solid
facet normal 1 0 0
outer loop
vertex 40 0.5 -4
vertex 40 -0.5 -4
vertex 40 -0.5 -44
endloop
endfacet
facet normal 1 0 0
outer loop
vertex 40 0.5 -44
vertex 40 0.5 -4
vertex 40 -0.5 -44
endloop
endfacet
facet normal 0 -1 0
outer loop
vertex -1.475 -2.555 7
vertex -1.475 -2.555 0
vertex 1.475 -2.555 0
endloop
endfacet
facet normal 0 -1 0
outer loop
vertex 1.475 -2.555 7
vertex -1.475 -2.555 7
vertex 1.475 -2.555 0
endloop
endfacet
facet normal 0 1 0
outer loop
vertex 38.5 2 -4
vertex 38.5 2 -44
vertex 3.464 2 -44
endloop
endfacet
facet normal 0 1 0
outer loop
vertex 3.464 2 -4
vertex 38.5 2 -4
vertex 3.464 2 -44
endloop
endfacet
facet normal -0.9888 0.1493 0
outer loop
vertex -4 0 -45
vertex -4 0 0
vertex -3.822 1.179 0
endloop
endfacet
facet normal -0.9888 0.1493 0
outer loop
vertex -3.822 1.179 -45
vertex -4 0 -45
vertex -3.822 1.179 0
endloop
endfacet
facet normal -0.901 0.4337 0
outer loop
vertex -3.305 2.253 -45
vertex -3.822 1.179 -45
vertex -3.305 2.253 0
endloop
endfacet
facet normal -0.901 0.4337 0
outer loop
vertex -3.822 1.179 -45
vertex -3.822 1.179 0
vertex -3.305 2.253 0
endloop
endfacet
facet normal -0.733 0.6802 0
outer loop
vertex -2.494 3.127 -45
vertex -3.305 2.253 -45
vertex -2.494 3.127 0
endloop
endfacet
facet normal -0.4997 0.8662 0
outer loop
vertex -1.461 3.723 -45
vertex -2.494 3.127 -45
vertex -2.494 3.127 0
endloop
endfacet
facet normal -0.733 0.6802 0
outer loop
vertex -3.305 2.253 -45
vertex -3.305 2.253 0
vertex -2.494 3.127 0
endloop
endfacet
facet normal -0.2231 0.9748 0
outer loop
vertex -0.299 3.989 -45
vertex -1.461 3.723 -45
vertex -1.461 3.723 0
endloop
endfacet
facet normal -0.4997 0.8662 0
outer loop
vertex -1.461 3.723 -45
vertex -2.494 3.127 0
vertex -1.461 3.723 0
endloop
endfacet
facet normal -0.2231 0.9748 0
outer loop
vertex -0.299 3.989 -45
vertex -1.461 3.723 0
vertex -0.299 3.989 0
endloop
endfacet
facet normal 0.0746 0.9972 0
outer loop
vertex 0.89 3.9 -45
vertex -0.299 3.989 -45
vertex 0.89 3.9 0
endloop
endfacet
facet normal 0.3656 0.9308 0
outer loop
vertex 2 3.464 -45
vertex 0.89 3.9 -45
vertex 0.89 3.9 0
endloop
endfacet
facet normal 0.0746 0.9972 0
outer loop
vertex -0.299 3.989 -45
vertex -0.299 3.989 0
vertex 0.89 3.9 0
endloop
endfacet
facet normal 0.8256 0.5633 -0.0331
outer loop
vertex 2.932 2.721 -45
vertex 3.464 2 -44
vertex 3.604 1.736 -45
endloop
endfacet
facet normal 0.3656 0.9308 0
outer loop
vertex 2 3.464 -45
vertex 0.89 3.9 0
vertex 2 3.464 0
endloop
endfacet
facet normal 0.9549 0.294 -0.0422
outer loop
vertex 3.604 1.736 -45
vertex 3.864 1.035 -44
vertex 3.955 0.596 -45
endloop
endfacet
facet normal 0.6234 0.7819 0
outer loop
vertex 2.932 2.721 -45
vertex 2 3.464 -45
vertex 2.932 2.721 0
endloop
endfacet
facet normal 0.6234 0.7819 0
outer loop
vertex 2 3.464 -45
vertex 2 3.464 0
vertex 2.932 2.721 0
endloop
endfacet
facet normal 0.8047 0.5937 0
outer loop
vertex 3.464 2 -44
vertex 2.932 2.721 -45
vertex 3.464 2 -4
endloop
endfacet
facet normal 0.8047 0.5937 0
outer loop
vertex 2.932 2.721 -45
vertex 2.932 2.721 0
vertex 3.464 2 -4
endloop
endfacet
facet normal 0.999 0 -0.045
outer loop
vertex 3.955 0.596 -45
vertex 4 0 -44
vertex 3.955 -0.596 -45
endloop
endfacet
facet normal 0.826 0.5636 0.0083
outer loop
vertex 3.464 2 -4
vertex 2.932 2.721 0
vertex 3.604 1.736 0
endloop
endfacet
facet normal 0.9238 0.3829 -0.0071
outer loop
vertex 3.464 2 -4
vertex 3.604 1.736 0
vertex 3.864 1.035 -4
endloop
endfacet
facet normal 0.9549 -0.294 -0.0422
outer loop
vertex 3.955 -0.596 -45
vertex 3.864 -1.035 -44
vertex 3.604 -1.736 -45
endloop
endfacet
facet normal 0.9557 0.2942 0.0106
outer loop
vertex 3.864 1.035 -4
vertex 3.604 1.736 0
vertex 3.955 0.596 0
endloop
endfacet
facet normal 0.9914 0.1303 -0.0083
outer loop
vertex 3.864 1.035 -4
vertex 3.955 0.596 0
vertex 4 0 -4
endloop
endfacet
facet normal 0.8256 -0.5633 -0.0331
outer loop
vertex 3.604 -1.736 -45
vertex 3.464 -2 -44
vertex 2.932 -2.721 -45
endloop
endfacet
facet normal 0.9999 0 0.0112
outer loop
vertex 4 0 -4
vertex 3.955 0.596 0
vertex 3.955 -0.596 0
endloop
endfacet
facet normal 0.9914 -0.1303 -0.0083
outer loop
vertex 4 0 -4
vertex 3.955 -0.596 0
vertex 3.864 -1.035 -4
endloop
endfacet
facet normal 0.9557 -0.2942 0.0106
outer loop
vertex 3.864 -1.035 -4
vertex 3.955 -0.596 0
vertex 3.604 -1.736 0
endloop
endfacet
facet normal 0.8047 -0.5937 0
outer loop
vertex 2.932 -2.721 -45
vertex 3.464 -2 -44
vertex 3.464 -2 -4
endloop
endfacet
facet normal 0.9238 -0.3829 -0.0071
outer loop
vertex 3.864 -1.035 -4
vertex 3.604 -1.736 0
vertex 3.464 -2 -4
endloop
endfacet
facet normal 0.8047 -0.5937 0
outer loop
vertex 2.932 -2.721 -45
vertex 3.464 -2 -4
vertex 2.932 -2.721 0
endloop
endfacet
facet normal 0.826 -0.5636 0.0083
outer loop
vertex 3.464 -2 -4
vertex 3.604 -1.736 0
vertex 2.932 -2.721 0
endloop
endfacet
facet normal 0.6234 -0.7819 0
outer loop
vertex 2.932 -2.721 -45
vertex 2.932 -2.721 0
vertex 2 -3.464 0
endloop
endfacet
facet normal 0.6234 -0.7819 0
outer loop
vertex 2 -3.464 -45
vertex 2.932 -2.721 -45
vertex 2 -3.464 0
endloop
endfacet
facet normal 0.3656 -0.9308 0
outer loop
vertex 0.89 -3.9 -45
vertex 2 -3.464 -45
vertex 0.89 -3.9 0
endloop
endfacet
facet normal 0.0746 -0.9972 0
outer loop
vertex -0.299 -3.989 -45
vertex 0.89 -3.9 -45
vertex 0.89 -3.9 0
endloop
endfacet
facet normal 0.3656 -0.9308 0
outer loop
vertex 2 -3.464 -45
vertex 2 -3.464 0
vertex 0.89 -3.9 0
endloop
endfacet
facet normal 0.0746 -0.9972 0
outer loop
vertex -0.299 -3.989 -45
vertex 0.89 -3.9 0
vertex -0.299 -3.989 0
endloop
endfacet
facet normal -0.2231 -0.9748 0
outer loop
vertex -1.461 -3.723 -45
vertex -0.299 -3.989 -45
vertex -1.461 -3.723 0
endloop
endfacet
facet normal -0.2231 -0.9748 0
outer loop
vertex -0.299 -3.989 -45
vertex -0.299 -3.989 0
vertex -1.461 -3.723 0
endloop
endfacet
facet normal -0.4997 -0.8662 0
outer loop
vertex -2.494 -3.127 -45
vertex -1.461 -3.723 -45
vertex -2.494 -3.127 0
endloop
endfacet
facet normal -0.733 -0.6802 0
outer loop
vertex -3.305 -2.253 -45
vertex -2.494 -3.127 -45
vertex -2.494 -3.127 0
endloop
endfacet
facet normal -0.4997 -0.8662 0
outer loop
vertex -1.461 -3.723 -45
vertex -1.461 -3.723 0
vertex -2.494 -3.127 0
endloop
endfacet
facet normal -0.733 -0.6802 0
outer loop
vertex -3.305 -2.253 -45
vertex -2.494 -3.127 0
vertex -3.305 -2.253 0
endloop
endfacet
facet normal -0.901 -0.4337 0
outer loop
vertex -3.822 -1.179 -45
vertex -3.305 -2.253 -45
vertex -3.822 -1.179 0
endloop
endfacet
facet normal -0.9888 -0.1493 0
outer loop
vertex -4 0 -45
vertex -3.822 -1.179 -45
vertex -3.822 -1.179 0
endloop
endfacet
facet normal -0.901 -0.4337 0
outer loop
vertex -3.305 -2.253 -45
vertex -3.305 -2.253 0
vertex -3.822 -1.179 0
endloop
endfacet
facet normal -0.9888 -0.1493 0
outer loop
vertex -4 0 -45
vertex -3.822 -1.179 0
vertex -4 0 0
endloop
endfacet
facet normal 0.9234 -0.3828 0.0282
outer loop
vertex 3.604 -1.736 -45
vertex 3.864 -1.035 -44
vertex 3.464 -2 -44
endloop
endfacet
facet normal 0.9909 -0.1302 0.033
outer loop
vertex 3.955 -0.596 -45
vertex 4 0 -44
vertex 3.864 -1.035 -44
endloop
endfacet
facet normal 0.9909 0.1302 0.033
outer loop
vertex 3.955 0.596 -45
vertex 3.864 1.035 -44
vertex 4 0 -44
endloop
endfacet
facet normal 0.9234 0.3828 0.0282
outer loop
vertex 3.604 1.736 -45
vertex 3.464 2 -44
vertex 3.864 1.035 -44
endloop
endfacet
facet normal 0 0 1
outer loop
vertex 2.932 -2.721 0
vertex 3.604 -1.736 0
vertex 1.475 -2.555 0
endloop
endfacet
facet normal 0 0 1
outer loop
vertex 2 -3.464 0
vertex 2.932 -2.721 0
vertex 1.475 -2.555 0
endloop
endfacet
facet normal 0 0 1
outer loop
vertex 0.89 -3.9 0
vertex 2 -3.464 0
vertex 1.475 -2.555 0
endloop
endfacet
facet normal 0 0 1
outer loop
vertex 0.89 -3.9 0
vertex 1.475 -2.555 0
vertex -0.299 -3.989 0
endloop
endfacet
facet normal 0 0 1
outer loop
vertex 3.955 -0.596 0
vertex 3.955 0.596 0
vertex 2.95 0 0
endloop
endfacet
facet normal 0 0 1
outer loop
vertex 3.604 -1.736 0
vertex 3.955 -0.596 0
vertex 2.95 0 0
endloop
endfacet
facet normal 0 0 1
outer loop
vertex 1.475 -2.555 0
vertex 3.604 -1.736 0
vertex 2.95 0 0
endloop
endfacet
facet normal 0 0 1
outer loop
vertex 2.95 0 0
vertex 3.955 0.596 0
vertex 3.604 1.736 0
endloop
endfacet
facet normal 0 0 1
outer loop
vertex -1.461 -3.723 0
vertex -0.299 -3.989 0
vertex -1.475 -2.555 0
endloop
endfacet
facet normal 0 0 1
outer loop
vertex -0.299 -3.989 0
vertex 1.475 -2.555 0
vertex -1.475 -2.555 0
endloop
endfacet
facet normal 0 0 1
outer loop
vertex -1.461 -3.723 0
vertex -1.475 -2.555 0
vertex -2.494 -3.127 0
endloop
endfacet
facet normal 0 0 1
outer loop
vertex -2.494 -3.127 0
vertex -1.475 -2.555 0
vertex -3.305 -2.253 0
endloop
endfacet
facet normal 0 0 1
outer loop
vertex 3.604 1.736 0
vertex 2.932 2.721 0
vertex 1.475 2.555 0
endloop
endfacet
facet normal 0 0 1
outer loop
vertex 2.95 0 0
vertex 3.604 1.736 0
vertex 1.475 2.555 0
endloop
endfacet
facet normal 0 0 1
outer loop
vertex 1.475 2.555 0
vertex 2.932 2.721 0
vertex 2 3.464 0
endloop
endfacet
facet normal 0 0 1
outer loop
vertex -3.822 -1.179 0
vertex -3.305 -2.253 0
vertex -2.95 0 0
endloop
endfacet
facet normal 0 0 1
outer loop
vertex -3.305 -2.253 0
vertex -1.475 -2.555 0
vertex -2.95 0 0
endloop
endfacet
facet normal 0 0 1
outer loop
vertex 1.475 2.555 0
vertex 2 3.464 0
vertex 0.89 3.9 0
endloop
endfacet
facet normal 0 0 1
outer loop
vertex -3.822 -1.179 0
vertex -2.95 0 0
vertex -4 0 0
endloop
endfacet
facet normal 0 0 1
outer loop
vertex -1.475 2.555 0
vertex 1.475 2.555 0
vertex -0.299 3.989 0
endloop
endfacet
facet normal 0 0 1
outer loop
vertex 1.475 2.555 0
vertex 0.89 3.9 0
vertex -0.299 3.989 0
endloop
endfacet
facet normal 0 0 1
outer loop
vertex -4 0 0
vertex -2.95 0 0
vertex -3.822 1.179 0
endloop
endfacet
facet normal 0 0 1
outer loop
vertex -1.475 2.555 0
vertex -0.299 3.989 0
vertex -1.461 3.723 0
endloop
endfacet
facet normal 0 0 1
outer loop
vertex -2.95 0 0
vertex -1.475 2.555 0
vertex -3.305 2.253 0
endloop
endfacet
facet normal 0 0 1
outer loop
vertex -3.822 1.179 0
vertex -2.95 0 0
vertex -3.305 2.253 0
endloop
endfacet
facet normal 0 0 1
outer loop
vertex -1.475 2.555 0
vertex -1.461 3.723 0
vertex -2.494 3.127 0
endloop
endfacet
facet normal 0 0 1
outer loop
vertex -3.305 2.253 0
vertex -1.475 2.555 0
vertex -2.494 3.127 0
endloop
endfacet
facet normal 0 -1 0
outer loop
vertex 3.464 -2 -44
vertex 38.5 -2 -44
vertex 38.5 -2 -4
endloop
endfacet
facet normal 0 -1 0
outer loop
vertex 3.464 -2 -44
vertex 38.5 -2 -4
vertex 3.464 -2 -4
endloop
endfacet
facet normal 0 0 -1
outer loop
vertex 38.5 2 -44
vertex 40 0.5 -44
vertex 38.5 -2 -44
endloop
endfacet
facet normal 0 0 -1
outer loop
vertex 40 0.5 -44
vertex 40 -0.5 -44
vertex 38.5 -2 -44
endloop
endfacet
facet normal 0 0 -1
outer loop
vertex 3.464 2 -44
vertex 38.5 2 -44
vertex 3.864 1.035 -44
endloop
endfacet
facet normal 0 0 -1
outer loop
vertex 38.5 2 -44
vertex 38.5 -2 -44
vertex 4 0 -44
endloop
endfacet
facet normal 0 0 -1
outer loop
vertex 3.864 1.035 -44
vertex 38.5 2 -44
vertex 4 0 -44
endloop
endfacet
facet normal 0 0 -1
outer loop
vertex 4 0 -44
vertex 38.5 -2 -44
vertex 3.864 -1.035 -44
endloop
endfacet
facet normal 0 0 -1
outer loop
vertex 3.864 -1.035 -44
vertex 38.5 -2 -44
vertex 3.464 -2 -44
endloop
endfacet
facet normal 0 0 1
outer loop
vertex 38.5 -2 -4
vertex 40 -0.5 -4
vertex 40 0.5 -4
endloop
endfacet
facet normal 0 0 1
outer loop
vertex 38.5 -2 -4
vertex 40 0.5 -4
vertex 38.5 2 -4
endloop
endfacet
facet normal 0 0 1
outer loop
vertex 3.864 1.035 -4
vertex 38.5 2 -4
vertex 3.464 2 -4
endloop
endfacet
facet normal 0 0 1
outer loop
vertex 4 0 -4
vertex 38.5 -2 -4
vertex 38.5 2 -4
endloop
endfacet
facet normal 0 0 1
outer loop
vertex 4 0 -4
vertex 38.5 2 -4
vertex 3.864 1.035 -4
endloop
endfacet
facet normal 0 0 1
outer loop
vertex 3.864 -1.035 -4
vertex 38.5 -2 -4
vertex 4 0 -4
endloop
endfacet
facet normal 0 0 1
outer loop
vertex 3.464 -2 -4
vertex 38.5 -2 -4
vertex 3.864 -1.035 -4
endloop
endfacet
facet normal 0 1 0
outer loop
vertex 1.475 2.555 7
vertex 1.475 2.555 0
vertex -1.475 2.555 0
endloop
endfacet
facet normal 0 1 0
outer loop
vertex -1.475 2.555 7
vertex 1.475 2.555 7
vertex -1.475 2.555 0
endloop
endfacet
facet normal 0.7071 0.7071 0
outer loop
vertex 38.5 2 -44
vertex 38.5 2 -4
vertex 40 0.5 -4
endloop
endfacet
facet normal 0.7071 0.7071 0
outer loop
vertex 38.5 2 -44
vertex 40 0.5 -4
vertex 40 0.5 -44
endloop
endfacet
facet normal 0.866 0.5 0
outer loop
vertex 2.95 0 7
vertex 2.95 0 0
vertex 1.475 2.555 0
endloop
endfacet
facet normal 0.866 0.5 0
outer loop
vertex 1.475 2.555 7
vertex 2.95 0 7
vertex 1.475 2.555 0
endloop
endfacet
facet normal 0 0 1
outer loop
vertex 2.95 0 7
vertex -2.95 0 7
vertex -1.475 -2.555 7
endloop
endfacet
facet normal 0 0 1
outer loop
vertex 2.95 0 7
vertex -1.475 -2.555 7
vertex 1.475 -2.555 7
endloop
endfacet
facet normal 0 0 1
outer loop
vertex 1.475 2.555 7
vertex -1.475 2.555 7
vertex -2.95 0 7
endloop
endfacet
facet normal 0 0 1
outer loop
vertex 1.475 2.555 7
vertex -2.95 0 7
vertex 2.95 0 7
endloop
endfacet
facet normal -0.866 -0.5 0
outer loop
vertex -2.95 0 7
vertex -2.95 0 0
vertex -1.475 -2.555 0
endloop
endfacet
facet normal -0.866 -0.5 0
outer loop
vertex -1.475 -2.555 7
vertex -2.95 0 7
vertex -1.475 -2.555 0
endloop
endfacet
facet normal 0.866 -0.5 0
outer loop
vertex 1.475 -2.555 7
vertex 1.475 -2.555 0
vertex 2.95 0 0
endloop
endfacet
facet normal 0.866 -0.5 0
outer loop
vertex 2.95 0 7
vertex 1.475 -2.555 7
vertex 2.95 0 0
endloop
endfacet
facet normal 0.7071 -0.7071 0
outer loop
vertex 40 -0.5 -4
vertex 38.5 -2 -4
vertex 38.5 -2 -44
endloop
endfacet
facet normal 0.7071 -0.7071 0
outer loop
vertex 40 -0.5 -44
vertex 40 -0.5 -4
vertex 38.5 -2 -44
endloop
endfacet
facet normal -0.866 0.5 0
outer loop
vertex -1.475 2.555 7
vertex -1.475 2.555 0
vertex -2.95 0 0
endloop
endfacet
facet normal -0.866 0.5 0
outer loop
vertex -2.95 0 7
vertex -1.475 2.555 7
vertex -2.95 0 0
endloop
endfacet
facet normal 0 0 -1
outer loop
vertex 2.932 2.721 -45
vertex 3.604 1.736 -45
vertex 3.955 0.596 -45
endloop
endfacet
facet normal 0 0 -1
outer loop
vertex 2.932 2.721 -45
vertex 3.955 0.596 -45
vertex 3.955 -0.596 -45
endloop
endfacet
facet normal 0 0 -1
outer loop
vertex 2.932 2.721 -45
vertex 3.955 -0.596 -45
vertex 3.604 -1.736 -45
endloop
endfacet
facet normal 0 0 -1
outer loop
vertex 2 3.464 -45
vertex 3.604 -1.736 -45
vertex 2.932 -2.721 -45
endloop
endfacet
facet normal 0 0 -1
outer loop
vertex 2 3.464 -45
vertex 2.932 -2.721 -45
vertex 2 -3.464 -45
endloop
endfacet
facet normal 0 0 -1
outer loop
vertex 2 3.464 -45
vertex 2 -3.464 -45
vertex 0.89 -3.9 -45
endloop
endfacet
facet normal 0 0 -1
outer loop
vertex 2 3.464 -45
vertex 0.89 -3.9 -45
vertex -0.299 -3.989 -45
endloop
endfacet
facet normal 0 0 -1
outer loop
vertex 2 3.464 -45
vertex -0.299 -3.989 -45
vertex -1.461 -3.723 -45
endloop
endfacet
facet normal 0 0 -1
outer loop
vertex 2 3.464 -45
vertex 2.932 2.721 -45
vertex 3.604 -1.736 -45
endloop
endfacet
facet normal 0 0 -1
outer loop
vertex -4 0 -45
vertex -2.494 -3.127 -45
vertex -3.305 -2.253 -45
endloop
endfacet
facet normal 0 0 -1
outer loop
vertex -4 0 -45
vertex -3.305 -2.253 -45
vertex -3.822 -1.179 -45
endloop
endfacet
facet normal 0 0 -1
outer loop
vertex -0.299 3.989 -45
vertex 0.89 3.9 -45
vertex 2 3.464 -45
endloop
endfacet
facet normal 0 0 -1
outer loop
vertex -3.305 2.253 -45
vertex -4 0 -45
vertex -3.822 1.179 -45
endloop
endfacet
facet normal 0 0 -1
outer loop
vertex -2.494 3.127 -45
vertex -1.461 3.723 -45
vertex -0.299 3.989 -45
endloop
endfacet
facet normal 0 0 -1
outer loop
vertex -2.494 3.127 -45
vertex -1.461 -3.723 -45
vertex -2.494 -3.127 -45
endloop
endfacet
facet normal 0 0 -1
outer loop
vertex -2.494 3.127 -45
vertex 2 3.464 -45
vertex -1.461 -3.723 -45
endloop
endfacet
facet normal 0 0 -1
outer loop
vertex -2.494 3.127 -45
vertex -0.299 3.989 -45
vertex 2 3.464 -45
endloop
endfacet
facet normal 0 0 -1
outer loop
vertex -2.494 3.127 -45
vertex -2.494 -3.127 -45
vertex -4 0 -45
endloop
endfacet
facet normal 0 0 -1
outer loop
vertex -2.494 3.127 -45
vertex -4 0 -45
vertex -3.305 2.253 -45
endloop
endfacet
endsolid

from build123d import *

# Parameters (mm, degrees)
SKETCH015_W               = 40
SKETCH015_H               = 40
EXTRUDE017_DEPTH          = 2
CHAMFER_SIZE              = 1.5
EXTRUDE023_DEPTH          = 7
SKETCH014_R               = 4
EXTRUDE016_DEPTH          = 45
FUSION007_PLACEMENT_ANGLE = 180


with BuildPart() as chamfer_body:
    # Sketch015 (on Extrude) → Extrude017 (new body, symmetric)
    with BuildSketch(Plane.XZ):
        with Locations((-20, 24)):
            Rectangle(SKETCH015_W, SKETCH015_H)
    extrude(amount=EXTRUDE017_DEPTH, both=True)

    # Chamfer
    chamfer_edges = [chamfer_body.edges().sort_by_distance(p)[0] for p in [
        (-40, 2, 24),
        (-40, -2, 24),
    ]]
    chamfer(chamfer_edges, length=CHAMFER_SIZE)


with BuildPart() as extrude023:
    # Sketch018 → Extrude023 (new body)
    with BuildSketch(Plane.XY):
        Polygon((-1.475, 2.554775), (1.475, 2.554775), (2.95, 0), (1.475, -2.554775), (-1.475, -2.554775), (-2.95, 0), align=None)
    extrude(amount=-EXTRUDE023_DEPTH)


with BuildPart() as flap:
    # Sketch014 → Extrude016 (new body)
    with BuildSketch(Plane.XY):
        Circle(SKETCH014_R)
    extrude(amount=EXTRUDE016_DEPTH)

    # Fusion007: union Chamfer body, Extrude023
    add(chamfer_body.part)
    add(extrude023.part)


with BuildPart() as flap_1:
    # Fusion007 placement: moved
    add(flap.part.rotate(Axis((0, 0, 0), (0, 1, 0)), FUSION007_PLACEMENT_ANGLE))


solid = flap_1.part
